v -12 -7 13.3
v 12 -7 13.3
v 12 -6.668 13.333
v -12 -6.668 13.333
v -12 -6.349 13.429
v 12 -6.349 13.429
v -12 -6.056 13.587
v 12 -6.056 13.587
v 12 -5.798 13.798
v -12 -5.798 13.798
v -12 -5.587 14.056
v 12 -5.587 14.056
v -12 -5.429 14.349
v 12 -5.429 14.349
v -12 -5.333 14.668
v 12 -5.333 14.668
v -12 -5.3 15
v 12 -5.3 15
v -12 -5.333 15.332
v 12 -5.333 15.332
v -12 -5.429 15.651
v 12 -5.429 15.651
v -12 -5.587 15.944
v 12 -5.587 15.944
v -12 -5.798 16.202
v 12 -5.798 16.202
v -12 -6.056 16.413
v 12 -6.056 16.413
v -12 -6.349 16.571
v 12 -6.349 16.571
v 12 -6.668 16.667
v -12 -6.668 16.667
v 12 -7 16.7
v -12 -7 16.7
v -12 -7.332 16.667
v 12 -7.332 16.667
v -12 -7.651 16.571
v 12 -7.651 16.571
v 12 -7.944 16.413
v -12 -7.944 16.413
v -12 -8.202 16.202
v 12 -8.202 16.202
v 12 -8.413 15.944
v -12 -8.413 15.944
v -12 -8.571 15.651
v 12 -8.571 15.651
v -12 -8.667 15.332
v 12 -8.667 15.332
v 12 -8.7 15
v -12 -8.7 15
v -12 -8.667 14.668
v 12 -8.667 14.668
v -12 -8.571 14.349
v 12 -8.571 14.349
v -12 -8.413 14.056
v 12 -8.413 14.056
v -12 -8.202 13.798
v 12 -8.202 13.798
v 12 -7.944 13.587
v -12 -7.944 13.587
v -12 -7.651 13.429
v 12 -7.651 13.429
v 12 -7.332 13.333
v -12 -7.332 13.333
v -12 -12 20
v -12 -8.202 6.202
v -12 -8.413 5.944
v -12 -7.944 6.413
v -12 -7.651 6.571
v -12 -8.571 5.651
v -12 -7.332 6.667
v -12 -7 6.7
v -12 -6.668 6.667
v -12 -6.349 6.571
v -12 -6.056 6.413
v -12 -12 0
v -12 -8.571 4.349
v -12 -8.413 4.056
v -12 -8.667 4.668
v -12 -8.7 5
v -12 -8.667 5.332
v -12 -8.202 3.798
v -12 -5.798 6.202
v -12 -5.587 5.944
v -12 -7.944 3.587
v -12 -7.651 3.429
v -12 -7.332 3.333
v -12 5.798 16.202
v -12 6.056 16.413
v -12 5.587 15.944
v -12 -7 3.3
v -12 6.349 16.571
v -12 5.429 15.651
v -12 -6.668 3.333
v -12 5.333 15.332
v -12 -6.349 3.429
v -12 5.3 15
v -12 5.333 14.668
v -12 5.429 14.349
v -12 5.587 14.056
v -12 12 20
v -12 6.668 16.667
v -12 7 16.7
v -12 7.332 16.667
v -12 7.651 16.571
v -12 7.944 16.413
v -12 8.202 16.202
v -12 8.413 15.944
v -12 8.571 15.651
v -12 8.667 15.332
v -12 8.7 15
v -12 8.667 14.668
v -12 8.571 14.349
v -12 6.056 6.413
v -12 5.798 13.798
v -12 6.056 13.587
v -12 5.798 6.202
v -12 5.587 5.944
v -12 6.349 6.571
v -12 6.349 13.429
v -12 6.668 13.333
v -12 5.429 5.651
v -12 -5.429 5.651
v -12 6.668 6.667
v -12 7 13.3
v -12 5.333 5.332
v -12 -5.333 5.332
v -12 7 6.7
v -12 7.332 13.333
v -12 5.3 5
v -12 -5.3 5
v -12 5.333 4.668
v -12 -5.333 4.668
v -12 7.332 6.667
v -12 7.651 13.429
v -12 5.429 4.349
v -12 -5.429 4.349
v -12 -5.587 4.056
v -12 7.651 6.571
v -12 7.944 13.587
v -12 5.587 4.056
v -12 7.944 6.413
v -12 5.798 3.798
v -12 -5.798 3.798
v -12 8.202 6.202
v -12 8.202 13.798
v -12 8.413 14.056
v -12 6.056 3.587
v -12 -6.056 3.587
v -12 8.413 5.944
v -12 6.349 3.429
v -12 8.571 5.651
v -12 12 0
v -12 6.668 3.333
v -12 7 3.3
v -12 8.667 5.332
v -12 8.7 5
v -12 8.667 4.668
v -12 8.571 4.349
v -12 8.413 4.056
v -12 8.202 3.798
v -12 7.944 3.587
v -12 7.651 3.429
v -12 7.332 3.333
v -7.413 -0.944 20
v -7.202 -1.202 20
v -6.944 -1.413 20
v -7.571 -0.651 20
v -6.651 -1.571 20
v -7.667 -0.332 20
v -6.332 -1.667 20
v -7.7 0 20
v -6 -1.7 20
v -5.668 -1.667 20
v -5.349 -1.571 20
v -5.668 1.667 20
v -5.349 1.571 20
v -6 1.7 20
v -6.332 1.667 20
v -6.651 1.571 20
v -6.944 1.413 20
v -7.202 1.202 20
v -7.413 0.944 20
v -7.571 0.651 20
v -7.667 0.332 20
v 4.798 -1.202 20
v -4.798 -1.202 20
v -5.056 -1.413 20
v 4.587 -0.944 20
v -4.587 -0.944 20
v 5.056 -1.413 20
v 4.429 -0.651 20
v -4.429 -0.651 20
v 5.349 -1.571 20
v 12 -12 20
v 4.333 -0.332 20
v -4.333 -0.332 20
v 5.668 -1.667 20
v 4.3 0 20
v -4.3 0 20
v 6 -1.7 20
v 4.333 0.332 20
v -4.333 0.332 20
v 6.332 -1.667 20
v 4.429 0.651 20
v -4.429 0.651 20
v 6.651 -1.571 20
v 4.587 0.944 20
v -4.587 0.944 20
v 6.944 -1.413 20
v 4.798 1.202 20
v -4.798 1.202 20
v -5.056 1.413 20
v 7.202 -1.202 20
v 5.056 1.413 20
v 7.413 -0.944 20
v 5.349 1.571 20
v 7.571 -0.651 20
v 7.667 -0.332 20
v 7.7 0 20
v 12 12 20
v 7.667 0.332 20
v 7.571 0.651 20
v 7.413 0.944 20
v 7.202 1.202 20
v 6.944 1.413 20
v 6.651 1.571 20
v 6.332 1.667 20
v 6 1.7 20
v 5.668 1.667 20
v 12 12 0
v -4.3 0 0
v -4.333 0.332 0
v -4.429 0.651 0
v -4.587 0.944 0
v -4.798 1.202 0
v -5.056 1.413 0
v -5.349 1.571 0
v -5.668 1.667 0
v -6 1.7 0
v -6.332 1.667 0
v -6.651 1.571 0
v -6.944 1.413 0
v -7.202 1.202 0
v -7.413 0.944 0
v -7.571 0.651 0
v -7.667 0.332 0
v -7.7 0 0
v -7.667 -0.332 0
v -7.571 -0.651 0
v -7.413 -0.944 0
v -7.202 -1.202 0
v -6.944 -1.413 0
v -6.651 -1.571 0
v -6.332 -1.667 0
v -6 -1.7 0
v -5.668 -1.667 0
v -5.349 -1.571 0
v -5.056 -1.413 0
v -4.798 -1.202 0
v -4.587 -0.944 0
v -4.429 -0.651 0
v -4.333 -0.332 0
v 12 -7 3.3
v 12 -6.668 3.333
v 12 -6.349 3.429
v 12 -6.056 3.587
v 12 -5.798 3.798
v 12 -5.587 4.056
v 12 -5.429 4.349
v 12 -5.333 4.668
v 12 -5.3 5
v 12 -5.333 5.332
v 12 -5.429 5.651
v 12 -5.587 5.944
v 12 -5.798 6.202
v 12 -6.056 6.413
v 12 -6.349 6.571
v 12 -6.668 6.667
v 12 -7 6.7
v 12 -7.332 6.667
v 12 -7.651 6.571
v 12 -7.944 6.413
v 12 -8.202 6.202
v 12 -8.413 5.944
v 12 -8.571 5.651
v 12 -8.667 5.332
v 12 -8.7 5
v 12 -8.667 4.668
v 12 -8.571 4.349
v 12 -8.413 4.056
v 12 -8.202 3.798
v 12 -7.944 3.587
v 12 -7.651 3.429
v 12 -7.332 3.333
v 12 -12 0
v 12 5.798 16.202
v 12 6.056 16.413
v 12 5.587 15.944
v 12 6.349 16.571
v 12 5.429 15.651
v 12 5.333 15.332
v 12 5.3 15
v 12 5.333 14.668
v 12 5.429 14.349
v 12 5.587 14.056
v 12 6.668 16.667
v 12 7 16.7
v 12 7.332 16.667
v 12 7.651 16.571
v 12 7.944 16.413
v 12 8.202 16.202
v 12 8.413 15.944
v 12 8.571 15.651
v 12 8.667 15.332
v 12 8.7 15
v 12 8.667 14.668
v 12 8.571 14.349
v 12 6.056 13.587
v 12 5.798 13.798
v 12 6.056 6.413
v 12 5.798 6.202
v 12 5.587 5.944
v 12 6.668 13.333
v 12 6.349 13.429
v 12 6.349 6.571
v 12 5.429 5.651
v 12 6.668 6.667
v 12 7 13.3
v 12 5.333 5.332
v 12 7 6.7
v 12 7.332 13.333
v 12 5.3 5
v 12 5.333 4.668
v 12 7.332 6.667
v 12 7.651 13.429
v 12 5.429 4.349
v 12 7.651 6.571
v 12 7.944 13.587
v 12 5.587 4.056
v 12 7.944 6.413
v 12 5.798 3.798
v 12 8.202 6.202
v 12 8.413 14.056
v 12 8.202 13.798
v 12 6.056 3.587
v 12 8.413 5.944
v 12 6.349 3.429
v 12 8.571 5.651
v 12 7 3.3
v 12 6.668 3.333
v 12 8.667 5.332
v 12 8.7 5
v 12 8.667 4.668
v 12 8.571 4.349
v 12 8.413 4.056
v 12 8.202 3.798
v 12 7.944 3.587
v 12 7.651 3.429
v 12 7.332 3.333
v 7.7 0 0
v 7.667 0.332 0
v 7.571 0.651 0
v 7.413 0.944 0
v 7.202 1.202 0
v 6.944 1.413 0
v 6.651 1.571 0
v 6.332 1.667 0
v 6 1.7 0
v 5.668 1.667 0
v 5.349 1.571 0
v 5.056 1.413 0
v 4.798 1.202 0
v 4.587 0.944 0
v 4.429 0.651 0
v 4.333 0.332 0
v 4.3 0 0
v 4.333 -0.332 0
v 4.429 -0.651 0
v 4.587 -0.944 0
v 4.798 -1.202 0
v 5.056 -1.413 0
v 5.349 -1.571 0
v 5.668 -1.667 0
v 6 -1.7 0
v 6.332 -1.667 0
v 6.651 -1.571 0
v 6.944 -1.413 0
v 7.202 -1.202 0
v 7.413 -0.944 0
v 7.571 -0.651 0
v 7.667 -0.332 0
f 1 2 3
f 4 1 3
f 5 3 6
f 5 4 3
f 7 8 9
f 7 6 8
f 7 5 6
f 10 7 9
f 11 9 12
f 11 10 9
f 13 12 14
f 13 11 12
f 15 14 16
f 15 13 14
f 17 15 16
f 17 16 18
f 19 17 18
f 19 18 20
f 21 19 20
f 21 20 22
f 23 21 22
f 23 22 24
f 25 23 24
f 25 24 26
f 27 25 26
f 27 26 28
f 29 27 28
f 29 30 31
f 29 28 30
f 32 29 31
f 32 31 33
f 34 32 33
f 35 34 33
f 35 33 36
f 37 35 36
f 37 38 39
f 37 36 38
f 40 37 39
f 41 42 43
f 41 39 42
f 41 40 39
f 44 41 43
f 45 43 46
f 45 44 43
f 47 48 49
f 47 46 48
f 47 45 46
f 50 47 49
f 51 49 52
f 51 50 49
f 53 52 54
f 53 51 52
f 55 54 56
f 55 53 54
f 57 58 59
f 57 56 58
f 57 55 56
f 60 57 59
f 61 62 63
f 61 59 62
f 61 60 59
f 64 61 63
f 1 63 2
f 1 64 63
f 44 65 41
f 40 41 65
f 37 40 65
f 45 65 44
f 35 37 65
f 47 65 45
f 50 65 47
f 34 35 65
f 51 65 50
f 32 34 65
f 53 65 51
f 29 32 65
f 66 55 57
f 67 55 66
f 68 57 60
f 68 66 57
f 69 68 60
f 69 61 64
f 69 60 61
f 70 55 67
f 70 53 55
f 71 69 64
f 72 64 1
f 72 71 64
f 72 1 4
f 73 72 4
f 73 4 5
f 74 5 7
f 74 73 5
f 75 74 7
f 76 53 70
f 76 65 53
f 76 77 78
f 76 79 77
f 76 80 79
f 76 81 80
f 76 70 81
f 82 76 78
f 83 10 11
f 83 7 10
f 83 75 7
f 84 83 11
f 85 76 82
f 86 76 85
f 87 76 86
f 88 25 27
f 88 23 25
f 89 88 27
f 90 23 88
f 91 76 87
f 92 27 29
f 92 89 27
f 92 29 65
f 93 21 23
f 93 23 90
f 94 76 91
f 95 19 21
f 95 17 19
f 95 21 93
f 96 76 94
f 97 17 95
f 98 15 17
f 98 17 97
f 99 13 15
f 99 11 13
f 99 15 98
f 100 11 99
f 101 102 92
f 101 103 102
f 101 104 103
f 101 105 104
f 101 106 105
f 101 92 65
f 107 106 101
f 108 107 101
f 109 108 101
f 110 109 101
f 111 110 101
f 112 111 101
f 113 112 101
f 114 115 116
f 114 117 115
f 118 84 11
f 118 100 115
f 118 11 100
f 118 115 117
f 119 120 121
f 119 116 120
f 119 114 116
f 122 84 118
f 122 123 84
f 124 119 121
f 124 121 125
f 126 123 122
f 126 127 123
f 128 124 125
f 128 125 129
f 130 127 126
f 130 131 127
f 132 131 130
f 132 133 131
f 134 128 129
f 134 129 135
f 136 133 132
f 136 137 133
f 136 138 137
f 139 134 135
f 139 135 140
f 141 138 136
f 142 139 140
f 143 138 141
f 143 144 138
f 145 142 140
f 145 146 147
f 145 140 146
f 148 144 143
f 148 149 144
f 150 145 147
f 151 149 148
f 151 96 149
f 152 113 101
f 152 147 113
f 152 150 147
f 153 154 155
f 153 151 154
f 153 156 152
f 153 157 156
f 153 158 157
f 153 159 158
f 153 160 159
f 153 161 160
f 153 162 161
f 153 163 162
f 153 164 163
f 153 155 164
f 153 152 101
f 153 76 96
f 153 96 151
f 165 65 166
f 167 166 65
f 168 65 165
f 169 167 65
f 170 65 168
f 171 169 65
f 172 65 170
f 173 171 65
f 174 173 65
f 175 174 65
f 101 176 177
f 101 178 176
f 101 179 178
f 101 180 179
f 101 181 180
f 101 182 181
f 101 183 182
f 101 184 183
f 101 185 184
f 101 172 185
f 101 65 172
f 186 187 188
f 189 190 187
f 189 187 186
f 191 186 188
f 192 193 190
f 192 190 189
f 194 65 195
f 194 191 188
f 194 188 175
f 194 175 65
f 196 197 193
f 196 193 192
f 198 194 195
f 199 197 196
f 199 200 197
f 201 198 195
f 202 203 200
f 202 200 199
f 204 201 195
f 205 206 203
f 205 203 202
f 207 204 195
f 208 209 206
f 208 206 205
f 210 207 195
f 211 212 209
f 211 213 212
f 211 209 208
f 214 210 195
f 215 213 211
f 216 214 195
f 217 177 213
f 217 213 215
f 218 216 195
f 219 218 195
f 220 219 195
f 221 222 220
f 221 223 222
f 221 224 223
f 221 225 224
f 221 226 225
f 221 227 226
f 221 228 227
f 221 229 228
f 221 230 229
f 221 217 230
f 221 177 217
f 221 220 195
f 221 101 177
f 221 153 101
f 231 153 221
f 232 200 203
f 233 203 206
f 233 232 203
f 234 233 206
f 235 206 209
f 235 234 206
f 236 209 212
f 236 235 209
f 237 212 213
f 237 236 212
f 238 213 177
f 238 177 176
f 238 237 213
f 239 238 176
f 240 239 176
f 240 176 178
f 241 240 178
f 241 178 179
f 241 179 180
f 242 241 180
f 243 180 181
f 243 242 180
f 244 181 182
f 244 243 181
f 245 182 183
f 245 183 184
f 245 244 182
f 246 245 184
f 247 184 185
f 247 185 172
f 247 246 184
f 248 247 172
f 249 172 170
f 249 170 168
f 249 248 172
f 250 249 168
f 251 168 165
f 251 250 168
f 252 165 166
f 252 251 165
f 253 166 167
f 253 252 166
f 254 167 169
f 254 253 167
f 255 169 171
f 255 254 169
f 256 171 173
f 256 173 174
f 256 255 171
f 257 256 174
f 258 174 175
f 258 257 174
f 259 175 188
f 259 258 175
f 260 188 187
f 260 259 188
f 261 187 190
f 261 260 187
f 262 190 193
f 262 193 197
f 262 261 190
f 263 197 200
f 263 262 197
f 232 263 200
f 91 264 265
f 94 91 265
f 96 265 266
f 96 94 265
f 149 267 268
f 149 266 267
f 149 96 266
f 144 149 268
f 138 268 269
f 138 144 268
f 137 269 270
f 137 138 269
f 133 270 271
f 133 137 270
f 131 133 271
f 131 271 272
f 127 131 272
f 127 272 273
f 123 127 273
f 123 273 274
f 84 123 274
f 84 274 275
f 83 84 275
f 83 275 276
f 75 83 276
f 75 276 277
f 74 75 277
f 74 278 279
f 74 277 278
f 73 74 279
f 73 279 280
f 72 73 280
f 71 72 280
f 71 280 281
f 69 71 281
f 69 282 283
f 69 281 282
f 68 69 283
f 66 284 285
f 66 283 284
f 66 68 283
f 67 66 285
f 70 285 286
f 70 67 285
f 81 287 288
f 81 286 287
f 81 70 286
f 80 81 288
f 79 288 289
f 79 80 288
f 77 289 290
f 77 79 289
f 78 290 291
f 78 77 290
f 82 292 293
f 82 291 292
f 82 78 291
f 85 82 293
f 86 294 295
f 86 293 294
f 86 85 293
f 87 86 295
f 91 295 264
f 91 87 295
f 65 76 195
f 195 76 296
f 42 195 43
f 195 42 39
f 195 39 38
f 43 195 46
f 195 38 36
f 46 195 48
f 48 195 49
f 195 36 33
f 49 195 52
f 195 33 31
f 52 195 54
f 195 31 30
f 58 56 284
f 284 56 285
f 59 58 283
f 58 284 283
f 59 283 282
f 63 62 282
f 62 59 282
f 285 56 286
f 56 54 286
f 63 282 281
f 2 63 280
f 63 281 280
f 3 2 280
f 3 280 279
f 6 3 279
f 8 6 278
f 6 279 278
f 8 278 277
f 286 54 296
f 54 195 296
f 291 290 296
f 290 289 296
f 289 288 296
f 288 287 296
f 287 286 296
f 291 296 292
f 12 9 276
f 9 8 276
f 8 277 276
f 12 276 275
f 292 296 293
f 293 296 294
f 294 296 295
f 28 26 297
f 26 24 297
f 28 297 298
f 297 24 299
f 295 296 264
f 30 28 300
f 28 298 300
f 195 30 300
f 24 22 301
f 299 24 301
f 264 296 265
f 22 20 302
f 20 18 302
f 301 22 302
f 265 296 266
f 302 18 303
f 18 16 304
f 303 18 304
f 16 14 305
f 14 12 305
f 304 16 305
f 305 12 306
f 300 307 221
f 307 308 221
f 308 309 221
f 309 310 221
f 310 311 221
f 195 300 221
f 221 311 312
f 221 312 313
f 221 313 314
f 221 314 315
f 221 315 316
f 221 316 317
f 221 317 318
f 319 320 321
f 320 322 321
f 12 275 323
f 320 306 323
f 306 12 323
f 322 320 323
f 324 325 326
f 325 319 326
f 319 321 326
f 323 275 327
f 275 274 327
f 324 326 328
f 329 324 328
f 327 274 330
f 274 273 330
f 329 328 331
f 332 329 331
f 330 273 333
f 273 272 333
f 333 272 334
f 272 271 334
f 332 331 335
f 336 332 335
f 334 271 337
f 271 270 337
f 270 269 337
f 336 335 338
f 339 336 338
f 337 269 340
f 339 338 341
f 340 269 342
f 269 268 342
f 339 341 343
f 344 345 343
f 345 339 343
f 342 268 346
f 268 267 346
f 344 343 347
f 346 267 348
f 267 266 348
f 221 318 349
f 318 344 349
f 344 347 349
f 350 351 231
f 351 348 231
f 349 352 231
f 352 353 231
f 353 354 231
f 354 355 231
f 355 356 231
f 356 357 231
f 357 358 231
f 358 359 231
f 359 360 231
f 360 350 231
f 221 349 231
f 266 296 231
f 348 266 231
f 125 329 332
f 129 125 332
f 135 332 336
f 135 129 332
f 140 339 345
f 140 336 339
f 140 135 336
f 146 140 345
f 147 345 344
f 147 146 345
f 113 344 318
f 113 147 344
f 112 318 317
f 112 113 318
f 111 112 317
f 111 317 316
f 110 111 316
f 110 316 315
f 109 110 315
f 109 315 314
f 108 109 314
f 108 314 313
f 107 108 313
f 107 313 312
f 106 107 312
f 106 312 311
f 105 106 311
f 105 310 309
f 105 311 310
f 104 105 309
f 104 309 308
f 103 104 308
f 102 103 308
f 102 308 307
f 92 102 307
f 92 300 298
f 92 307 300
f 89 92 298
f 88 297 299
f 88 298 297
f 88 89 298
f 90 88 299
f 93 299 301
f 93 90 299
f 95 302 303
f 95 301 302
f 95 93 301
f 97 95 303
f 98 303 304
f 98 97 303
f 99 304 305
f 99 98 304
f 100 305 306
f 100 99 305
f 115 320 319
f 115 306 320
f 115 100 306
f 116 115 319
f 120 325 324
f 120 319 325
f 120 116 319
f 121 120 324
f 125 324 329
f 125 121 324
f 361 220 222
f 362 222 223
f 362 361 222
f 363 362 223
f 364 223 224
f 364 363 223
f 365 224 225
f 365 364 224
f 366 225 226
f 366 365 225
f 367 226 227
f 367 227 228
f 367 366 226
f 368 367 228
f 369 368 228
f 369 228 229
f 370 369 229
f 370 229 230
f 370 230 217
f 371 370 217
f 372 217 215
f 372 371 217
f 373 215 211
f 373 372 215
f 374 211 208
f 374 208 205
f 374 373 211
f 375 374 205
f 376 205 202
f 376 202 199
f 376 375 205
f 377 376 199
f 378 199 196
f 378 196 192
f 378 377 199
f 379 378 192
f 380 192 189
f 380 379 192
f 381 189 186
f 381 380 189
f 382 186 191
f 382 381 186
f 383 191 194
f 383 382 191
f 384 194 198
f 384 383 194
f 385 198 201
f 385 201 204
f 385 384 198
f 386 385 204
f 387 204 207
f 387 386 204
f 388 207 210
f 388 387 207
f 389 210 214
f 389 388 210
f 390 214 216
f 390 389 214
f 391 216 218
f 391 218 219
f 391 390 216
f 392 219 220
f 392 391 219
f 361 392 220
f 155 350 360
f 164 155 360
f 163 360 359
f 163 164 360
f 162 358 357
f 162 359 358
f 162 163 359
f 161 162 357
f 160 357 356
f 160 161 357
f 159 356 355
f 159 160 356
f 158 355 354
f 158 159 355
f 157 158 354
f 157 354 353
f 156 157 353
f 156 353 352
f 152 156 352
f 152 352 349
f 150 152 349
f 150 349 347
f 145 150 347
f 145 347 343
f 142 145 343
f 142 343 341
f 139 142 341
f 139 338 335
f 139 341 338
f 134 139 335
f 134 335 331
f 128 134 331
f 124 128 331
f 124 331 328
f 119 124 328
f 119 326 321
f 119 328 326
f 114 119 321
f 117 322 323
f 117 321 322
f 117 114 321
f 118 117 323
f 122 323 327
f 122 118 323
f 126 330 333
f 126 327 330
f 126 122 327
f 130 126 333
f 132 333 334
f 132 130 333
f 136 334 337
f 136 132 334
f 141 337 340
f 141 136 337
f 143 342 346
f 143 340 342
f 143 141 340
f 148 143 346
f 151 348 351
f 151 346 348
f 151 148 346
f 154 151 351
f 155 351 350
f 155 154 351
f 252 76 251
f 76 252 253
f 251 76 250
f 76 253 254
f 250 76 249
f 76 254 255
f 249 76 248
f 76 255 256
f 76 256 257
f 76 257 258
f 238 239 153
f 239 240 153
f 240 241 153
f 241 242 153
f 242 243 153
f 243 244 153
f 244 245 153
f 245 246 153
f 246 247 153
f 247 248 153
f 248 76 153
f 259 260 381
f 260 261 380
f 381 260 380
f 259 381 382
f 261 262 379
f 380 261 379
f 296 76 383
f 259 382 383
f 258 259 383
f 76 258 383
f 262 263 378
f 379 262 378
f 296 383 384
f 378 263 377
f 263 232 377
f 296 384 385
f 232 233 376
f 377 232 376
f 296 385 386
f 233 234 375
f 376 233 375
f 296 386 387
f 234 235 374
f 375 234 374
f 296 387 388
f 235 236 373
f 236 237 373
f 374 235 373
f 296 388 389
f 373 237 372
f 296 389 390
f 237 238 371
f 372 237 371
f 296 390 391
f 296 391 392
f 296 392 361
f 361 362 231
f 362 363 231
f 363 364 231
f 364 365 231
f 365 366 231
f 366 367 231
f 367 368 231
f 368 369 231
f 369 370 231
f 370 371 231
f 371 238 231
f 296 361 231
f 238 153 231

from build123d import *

# Parameters (mm, degrees)
SKETCH_1_W                                          = 24
SKETCH_1_H                                          = 24
SKETCH_1_R                                          = 1.7
WRIST_SPACER_W20_DEPTH                              = 20
GRIPPER_ADAPTER_M3_14X10_NOT_SG90_DIRECT_DEPTH      = 27.229754097
GRIPPER_ADAPTER_M3_14X10_NOT_SG90_DIRECT_DEPTH_BACK = 27.229754097
SKETCH_2_R                                          = 1.7


with BuildPart() as part:
    # 草图1 → Wrist_spacer_W20 (new body)
    with BuildSketch(Plane.XY):
        Rectangle(SKETCH_1_W, SKETCH_1_H)
        with Locations((-6, 0)):
            Circle(SKETCH_1_R, mode=Mode.SUBTRACT)
        with Locations((6, 0)):
            Circle(SKETCH_1_R, mode=Mode.SUBTRACT)
    extrude(amount=WRIST_SPACER_W20_DEPTH)

    # 草图2 → Gripper_adapter_M3_14x10_NOT_SG90_DIRECT (cut, two sides: drawn at the far end of the back side and taken through both)
    with BuildSketch(Plane(origin=(0, 0, 0), x_dir=(0, 0, -1), z_dir=(1, 0, 0)).offset(-GRIPPER_ADAPTER_M3_14X10_NOT_SG90_DIRECT_DEPTH_BACK)):
        with Locations((-5, -7)):
            Circle(SKETCH_2_R)
        with Locations((-15, -7)):
            Circle(SKETCH_2_R)
        with Locations((-5, 7)):
            Circle(SKETCH_2_R)
        with Locations((-15, 7)):
            Circle(SKETCH_2_R)
    extrude(amount=GRIPPER_ADAPTER_M3_14X10_NOT_SG90_DIRECT_DEPTH + GRIPPER_ADAPTER_M3_14X10_NOT_SG90_DIRECT_DEPTH_BACK, mode=Mode.SUBTRACT)


solid = part.part
